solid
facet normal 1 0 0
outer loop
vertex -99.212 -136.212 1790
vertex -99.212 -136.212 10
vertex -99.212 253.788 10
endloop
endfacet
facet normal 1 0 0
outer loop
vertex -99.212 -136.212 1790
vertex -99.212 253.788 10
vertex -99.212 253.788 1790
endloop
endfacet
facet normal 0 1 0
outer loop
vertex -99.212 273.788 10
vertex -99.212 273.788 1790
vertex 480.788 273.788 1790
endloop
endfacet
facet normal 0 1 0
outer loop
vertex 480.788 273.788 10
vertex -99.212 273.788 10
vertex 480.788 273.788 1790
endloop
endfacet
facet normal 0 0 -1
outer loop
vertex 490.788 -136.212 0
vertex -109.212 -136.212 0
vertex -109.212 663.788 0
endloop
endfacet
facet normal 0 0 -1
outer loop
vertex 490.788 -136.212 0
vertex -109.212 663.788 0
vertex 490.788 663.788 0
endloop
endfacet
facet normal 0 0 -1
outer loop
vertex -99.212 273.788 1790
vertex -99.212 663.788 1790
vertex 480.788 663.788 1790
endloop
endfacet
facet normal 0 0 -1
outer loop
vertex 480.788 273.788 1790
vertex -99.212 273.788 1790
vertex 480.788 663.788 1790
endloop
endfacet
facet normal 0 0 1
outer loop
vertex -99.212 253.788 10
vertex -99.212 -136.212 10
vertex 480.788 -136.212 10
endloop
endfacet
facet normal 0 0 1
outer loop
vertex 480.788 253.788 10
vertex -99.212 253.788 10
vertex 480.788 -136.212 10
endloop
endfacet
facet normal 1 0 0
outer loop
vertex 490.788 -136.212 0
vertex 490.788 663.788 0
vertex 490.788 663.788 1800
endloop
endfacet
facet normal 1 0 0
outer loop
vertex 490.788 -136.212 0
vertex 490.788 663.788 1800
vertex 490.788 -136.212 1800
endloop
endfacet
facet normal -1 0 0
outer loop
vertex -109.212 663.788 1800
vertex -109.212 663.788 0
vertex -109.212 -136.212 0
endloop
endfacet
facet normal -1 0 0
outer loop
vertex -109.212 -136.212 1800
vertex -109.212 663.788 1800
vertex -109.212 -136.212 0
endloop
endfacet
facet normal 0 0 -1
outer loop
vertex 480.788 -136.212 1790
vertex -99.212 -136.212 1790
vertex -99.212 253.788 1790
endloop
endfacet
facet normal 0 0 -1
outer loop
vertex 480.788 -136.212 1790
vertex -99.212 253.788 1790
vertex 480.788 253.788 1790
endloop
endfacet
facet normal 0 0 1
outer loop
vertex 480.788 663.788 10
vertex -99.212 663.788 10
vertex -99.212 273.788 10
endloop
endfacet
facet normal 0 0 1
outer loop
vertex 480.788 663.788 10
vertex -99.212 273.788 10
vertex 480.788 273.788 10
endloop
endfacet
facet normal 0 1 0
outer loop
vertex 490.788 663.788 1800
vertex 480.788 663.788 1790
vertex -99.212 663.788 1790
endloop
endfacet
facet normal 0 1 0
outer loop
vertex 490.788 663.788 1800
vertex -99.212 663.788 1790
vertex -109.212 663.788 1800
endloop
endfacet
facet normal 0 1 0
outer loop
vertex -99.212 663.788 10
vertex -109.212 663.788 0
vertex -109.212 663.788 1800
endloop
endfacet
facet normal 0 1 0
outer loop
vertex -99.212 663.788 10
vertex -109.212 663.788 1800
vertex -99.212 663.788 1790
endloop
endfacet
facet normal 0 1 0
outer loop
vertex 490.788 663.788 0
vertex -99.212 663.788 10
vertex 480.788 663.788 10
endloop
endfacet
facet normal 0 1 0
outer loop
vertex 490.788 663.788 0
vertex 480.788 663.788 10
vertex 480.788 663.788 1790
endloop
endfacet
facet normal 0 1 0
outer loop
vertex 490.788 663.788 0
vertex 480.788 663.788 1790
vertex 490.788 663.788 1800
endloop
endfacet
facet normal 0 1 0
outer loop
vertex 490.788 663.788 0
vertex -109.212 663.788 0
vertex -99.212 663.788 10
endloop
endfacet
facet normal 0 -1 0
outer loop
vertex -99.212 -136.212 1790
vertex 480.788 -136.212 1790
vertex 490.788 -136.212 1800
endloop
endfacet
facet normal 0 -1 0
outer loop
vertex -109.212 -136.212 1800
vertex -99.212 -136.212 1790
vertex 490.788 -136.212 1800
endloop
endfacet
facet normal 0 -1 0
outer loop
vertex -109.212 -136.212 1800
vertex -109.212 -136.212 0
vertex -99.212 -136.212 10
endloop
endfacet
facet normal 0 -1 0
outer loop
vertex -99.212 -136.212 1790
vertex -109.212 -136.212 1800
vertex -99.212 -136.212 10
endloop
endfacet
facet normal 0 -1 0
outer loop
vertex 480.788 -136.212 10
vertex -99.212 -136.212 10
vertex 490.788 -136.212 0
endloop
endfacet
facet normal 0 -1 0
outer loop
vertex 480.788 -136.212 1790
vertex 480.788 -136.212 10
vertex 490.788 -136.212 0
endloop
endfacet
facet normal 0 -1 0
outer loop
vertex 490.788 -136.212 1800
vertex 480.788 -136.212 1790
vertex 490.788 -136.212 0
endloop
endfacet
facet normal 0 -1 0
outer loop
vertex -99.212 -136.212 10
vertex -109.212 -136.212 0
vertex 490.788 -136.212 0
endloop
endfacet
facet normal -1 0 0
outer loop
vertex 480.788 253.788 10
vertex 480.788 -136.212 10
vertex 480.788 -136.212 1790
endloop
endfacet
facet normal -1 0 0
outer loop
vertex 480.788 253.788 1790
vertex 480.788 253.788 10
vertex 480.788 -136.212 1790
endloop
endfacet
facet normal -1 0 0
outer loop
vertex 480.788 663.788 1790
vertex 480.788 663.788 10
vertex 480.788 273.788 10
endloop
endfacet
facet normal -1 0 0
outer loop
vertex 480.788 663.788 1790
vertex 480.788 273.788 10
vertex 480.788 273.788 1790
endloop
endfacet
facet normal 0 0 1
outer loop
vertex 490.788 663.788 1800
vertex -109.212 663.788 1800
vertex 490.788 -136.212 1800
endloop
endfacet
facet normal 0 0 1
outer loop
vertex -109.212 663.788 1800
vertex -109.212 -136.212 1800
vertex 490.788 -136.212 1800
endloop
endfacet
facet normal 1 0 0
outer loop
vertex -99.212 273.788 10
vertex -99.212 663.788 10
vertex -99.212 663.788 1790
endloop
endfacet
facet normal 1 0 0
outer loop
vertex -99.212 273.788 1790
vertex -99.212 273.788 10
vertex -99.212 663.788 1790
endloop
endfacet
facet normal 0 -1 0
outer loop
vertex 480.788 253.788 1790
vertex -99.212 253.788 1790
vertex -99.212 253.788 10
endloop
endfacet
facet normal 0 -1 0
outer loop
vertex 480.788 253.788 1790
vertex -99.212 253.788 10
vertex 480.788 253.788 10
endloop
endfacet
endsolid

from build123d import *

# Parameters (mm, degrees)
F0_W     = 600
F0_H     = 400
F1_DEPTH = 1800
F2_W     = 580
F2_H     = 1780
F3_DEPTH = 390


with BuildPart() as f1:
    # F0 (on Top) → F1 (new body)
    with BuildSketch(Plane.XY):
        with Locations((190.787974, 63.787562)):
            Rectangle(F0_W, F0_H)
    extrude(amount=F1_DEPTH)

    # F2 (on face) → F3 (cut)
    with BuildSketch(Plane.XZ.offset(136.212438)):
        with Locations((190.787974, 900)):
            Rectangle(F2_W, F2_H)
    extrude(amount=-F3_DEPTH, mode=Mode.SUBTRACT)

    # F4: F1 across face


with BuildPart() as f1_1:
    add(f1.part)
    add(f1.part.mirror(Plane(origin=(190.787974, 263.787562, 900), x_dir=(-1, 0, 0), z_dir=(0, 1, 0))))


solid = f1_1.part
